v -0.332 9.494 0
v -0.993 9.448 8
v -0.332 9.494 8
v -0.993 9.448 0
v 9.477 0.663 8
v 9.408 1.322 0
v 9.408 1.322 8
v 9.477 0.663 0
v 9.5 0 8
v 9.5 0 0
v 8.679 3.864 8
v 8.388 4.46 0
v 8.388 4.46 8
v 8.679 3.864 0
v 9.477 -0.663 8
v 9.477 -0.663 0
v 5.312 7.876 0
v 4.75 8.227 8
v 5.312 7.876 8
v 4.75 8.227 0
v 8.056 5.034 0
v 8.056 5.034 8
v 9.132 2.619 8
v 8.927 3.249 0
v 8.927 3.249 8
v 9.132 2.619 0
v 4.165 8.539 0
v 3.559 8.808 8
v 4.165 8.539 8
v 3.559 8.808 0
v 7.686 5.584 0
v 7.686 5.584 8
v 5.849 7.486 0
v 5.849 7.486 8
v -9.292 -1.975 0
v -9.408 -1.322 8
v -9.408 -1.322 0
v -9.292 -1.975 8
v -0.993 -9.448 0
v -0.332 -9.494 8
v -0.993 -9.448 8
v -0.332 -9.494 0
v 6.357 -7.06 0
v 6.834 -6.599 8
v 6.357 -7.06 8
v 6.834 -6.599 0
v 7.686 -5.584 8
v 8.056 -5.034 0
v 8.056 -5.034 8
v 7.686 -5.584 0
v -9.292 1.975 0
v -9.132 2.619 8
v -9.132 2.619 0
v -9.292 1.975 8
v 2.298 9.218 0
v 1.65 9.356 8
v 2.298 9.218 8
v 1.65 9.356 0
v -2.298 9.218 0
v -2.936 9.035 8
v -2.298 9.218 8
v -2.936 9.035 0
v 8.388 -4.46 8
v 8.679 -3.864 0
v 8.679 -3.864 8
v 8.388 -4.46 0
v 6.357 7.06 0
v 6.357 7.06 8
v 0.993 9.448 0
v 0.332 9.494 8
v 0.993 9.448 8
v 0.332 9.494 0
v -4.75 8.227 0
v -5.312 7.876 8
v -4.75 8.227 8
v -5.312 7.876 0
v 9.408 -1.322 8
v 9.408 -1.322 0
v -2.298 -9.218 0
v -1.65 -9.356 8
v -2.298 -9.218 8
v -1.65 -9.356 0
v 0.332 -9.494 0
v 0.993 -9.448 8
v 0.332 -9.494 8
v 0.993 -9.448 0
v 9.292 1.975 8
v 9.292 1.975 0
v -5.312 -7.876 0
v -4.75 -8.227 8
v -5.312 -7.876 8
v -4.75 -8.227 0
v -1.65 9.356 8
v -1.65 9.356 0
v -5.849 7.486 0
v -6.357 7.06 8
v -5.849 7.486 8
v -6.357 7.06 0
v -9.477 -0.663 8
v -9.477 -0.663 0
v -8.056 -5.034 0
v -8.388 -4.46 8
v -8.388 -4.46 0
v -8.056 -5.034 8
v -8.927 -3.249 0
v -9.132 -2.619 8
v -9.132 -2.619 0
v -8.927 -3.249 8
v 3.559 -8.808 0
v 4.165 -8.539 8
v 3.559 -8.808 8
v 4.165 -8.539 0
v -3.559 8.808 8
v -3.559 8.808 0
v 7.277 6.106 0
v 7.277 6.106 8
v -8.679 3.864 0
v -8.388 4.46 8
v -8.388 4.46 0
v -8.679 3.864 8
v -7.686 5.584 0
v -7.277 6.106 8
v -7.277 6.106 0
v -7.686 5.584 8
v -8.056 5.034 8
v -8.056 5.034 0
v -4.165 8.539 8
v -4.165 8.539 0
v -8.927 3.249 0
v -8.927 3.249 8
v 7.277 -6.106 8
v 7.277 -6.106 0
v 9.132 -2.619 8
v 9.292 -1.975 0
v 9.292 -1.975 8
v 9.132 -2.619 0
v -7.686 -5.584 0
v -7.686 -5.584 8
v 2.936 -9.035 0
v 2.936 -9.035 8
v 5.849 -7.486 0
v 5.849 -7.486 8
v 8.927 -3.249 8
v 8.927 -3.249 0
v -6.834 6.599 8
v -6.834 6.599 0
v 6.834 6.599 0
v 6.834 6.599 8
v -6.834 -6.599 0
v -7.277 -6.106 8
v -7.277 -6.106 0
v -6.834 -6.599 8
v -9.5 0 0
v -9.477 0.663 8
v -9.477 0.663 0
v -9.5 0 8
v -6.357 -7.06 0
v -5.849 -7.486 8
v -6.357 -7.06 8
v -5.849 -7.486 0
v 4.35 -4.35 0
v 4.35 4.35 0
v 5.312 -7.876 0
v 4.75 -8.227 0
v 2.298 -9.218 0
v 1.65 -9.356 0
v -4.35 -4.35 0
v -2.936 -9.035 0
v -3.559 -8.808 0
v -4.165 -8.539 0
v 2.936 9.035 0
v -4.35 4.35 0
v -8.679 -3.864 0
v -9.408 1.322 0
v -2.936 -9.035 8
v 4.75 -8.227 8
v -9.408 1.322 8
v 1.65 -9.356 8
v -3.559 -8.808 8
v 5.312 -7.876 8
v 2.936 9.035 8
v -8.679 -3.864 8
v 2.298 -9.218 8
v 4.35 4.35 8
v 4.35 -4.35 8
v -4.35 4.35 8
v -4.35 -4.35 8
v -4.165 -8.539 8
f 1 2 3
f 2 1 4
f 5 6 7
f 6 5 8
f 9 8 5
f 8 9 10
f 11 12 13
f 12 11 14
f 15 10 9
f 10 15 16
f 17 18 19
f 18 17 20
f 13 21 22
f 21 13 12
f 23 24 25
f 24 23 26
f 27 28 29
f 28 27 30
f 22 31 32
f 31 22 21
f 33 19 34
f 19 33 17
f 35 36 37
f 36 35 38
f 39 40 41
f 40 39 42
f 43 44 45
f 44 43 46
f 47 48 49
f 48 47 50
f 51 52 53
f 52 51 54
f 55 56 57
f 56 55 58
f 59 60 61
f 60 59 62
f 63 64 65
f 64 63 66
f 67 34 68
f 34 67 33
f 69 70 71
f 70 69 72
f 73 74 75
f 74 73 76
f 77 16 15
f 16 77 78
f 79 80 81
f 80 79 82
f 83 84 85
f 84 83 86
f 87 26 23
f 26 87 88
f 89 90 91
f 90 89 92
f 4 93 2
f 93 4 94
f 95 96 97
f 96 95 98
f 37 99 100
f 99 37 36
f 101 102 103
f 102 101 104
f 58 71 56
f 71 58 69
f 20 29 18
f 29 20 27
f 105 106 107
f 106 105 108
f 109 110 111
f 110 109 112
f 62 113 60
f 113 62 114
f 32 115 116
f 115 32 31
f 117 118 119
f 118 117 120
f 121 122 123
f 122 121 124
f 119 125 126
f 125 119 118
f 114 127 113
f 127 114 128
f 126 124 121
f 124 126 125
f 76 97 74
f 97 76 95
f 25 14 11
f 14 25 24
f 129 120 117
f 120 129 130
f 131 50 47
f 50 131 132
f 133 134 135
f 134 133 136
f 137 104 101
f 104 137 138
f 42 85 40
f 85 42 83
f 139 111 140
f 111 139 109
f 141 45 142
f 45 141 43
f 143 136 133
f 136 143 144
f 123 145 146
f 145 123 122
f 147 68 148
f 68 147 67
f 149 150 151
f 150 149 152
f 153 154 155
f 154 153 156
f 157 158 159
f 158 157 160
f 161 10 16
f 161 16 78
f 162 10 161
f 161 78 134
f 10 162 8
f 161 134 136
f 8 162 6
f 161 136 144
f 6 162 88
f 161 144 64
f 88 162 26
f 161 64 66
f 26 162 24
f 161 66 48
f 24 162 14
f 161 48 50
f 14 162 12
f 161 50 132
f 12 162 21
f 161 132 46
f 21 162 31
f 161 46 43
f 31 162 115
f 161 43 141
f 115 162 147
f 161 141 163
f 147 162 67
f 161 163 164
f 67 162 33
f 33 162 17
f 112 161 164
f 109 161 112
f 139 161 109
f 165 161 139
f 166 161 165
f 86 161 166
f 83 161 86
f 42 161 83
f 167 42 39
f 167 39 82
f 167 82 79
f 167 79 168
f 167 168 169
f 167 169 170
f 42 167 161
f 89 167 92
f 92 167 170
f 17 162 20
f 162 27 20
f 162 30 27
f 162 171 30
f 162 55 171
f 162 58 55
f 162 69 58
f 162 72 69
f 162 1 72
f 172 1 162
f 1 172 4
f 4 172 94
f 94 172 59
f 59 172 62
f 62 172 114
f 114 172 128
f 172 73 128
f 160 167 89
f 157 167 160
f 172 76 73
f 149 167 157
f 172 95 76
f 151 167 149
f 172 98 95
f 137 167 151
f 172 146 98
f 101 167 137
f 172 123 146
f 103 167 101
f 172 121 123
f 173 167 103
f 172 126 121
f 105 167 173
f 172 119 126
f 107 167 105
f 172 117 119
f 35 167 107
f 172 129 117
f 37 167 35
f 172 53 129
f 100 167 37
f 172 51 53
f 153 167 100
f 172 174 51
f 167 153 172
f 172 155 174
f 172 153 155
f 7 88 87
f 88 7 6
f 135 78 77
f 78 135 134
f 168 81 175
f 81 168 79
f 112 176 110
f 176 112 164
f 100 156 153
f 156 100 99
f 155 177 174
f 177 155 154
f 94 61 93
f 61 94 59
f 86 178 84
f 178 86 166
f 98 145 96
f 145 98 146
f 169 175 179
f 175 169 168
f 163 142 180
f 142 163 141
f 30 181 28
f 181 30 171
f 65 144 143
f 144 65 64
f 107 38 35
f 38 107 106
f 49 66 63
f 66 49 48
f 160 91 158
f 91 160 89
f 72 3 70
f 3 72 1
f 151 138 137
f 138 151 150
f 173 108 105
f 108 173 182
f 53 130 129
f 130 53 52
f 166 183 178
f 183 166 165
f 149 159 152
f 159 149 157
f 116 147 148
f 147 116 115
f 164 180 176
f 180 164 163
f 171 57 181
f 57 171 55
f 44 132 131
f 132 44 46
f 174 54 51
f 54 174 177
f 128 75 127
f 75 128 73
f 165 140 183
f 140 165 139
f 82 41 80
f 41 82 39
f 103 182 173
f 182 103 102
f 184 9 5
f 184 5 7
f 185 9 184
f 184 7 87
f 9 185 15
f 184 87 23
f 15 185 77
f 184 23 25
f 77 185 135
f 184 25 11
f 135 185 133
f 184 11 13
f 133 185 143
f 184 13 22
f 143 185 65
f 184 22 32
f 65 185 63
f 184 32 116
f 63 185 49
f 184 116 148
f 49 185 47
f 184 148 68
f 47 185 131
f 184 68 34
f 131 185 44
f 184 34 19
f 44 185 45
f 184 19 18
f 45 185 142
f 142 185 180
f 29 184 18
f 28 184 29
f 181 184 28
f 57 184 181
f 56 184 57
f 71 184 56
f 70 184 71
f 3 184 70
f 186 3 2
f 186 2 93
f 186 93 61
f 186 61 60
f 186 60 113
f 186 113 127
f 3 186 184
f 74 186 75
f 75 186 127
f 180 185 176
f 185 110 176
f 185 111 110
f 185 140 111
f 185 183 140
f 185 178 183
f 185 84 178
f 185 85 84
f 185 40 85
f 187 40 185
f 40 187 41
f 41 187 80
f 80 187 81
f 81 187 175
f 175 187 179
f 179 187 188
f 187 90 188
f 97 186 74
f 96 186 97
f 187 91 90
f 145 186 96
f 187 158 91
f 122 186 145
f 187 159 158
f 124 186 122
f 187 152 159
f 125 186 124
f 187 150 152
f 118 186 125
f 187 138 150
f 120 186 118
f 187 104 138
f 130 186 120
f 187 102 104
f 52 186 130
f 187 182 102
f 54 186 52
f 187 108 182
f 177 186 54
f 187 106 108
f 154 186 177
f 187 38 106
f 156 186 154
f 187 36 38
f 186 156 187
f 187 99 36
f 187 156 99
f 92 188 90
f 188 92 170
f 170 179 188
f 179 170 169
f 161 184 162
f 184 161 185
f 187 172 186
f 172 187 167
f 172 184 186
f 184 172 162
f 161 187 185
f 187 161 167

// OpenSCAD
$fn = 90;
d=19;
sq=8.7;
h=8;

difference() {
   cylinder(d=d, h=h, center=false);
    translate([-sq/2, -sq/2, 0])
    cube(sq);
}
